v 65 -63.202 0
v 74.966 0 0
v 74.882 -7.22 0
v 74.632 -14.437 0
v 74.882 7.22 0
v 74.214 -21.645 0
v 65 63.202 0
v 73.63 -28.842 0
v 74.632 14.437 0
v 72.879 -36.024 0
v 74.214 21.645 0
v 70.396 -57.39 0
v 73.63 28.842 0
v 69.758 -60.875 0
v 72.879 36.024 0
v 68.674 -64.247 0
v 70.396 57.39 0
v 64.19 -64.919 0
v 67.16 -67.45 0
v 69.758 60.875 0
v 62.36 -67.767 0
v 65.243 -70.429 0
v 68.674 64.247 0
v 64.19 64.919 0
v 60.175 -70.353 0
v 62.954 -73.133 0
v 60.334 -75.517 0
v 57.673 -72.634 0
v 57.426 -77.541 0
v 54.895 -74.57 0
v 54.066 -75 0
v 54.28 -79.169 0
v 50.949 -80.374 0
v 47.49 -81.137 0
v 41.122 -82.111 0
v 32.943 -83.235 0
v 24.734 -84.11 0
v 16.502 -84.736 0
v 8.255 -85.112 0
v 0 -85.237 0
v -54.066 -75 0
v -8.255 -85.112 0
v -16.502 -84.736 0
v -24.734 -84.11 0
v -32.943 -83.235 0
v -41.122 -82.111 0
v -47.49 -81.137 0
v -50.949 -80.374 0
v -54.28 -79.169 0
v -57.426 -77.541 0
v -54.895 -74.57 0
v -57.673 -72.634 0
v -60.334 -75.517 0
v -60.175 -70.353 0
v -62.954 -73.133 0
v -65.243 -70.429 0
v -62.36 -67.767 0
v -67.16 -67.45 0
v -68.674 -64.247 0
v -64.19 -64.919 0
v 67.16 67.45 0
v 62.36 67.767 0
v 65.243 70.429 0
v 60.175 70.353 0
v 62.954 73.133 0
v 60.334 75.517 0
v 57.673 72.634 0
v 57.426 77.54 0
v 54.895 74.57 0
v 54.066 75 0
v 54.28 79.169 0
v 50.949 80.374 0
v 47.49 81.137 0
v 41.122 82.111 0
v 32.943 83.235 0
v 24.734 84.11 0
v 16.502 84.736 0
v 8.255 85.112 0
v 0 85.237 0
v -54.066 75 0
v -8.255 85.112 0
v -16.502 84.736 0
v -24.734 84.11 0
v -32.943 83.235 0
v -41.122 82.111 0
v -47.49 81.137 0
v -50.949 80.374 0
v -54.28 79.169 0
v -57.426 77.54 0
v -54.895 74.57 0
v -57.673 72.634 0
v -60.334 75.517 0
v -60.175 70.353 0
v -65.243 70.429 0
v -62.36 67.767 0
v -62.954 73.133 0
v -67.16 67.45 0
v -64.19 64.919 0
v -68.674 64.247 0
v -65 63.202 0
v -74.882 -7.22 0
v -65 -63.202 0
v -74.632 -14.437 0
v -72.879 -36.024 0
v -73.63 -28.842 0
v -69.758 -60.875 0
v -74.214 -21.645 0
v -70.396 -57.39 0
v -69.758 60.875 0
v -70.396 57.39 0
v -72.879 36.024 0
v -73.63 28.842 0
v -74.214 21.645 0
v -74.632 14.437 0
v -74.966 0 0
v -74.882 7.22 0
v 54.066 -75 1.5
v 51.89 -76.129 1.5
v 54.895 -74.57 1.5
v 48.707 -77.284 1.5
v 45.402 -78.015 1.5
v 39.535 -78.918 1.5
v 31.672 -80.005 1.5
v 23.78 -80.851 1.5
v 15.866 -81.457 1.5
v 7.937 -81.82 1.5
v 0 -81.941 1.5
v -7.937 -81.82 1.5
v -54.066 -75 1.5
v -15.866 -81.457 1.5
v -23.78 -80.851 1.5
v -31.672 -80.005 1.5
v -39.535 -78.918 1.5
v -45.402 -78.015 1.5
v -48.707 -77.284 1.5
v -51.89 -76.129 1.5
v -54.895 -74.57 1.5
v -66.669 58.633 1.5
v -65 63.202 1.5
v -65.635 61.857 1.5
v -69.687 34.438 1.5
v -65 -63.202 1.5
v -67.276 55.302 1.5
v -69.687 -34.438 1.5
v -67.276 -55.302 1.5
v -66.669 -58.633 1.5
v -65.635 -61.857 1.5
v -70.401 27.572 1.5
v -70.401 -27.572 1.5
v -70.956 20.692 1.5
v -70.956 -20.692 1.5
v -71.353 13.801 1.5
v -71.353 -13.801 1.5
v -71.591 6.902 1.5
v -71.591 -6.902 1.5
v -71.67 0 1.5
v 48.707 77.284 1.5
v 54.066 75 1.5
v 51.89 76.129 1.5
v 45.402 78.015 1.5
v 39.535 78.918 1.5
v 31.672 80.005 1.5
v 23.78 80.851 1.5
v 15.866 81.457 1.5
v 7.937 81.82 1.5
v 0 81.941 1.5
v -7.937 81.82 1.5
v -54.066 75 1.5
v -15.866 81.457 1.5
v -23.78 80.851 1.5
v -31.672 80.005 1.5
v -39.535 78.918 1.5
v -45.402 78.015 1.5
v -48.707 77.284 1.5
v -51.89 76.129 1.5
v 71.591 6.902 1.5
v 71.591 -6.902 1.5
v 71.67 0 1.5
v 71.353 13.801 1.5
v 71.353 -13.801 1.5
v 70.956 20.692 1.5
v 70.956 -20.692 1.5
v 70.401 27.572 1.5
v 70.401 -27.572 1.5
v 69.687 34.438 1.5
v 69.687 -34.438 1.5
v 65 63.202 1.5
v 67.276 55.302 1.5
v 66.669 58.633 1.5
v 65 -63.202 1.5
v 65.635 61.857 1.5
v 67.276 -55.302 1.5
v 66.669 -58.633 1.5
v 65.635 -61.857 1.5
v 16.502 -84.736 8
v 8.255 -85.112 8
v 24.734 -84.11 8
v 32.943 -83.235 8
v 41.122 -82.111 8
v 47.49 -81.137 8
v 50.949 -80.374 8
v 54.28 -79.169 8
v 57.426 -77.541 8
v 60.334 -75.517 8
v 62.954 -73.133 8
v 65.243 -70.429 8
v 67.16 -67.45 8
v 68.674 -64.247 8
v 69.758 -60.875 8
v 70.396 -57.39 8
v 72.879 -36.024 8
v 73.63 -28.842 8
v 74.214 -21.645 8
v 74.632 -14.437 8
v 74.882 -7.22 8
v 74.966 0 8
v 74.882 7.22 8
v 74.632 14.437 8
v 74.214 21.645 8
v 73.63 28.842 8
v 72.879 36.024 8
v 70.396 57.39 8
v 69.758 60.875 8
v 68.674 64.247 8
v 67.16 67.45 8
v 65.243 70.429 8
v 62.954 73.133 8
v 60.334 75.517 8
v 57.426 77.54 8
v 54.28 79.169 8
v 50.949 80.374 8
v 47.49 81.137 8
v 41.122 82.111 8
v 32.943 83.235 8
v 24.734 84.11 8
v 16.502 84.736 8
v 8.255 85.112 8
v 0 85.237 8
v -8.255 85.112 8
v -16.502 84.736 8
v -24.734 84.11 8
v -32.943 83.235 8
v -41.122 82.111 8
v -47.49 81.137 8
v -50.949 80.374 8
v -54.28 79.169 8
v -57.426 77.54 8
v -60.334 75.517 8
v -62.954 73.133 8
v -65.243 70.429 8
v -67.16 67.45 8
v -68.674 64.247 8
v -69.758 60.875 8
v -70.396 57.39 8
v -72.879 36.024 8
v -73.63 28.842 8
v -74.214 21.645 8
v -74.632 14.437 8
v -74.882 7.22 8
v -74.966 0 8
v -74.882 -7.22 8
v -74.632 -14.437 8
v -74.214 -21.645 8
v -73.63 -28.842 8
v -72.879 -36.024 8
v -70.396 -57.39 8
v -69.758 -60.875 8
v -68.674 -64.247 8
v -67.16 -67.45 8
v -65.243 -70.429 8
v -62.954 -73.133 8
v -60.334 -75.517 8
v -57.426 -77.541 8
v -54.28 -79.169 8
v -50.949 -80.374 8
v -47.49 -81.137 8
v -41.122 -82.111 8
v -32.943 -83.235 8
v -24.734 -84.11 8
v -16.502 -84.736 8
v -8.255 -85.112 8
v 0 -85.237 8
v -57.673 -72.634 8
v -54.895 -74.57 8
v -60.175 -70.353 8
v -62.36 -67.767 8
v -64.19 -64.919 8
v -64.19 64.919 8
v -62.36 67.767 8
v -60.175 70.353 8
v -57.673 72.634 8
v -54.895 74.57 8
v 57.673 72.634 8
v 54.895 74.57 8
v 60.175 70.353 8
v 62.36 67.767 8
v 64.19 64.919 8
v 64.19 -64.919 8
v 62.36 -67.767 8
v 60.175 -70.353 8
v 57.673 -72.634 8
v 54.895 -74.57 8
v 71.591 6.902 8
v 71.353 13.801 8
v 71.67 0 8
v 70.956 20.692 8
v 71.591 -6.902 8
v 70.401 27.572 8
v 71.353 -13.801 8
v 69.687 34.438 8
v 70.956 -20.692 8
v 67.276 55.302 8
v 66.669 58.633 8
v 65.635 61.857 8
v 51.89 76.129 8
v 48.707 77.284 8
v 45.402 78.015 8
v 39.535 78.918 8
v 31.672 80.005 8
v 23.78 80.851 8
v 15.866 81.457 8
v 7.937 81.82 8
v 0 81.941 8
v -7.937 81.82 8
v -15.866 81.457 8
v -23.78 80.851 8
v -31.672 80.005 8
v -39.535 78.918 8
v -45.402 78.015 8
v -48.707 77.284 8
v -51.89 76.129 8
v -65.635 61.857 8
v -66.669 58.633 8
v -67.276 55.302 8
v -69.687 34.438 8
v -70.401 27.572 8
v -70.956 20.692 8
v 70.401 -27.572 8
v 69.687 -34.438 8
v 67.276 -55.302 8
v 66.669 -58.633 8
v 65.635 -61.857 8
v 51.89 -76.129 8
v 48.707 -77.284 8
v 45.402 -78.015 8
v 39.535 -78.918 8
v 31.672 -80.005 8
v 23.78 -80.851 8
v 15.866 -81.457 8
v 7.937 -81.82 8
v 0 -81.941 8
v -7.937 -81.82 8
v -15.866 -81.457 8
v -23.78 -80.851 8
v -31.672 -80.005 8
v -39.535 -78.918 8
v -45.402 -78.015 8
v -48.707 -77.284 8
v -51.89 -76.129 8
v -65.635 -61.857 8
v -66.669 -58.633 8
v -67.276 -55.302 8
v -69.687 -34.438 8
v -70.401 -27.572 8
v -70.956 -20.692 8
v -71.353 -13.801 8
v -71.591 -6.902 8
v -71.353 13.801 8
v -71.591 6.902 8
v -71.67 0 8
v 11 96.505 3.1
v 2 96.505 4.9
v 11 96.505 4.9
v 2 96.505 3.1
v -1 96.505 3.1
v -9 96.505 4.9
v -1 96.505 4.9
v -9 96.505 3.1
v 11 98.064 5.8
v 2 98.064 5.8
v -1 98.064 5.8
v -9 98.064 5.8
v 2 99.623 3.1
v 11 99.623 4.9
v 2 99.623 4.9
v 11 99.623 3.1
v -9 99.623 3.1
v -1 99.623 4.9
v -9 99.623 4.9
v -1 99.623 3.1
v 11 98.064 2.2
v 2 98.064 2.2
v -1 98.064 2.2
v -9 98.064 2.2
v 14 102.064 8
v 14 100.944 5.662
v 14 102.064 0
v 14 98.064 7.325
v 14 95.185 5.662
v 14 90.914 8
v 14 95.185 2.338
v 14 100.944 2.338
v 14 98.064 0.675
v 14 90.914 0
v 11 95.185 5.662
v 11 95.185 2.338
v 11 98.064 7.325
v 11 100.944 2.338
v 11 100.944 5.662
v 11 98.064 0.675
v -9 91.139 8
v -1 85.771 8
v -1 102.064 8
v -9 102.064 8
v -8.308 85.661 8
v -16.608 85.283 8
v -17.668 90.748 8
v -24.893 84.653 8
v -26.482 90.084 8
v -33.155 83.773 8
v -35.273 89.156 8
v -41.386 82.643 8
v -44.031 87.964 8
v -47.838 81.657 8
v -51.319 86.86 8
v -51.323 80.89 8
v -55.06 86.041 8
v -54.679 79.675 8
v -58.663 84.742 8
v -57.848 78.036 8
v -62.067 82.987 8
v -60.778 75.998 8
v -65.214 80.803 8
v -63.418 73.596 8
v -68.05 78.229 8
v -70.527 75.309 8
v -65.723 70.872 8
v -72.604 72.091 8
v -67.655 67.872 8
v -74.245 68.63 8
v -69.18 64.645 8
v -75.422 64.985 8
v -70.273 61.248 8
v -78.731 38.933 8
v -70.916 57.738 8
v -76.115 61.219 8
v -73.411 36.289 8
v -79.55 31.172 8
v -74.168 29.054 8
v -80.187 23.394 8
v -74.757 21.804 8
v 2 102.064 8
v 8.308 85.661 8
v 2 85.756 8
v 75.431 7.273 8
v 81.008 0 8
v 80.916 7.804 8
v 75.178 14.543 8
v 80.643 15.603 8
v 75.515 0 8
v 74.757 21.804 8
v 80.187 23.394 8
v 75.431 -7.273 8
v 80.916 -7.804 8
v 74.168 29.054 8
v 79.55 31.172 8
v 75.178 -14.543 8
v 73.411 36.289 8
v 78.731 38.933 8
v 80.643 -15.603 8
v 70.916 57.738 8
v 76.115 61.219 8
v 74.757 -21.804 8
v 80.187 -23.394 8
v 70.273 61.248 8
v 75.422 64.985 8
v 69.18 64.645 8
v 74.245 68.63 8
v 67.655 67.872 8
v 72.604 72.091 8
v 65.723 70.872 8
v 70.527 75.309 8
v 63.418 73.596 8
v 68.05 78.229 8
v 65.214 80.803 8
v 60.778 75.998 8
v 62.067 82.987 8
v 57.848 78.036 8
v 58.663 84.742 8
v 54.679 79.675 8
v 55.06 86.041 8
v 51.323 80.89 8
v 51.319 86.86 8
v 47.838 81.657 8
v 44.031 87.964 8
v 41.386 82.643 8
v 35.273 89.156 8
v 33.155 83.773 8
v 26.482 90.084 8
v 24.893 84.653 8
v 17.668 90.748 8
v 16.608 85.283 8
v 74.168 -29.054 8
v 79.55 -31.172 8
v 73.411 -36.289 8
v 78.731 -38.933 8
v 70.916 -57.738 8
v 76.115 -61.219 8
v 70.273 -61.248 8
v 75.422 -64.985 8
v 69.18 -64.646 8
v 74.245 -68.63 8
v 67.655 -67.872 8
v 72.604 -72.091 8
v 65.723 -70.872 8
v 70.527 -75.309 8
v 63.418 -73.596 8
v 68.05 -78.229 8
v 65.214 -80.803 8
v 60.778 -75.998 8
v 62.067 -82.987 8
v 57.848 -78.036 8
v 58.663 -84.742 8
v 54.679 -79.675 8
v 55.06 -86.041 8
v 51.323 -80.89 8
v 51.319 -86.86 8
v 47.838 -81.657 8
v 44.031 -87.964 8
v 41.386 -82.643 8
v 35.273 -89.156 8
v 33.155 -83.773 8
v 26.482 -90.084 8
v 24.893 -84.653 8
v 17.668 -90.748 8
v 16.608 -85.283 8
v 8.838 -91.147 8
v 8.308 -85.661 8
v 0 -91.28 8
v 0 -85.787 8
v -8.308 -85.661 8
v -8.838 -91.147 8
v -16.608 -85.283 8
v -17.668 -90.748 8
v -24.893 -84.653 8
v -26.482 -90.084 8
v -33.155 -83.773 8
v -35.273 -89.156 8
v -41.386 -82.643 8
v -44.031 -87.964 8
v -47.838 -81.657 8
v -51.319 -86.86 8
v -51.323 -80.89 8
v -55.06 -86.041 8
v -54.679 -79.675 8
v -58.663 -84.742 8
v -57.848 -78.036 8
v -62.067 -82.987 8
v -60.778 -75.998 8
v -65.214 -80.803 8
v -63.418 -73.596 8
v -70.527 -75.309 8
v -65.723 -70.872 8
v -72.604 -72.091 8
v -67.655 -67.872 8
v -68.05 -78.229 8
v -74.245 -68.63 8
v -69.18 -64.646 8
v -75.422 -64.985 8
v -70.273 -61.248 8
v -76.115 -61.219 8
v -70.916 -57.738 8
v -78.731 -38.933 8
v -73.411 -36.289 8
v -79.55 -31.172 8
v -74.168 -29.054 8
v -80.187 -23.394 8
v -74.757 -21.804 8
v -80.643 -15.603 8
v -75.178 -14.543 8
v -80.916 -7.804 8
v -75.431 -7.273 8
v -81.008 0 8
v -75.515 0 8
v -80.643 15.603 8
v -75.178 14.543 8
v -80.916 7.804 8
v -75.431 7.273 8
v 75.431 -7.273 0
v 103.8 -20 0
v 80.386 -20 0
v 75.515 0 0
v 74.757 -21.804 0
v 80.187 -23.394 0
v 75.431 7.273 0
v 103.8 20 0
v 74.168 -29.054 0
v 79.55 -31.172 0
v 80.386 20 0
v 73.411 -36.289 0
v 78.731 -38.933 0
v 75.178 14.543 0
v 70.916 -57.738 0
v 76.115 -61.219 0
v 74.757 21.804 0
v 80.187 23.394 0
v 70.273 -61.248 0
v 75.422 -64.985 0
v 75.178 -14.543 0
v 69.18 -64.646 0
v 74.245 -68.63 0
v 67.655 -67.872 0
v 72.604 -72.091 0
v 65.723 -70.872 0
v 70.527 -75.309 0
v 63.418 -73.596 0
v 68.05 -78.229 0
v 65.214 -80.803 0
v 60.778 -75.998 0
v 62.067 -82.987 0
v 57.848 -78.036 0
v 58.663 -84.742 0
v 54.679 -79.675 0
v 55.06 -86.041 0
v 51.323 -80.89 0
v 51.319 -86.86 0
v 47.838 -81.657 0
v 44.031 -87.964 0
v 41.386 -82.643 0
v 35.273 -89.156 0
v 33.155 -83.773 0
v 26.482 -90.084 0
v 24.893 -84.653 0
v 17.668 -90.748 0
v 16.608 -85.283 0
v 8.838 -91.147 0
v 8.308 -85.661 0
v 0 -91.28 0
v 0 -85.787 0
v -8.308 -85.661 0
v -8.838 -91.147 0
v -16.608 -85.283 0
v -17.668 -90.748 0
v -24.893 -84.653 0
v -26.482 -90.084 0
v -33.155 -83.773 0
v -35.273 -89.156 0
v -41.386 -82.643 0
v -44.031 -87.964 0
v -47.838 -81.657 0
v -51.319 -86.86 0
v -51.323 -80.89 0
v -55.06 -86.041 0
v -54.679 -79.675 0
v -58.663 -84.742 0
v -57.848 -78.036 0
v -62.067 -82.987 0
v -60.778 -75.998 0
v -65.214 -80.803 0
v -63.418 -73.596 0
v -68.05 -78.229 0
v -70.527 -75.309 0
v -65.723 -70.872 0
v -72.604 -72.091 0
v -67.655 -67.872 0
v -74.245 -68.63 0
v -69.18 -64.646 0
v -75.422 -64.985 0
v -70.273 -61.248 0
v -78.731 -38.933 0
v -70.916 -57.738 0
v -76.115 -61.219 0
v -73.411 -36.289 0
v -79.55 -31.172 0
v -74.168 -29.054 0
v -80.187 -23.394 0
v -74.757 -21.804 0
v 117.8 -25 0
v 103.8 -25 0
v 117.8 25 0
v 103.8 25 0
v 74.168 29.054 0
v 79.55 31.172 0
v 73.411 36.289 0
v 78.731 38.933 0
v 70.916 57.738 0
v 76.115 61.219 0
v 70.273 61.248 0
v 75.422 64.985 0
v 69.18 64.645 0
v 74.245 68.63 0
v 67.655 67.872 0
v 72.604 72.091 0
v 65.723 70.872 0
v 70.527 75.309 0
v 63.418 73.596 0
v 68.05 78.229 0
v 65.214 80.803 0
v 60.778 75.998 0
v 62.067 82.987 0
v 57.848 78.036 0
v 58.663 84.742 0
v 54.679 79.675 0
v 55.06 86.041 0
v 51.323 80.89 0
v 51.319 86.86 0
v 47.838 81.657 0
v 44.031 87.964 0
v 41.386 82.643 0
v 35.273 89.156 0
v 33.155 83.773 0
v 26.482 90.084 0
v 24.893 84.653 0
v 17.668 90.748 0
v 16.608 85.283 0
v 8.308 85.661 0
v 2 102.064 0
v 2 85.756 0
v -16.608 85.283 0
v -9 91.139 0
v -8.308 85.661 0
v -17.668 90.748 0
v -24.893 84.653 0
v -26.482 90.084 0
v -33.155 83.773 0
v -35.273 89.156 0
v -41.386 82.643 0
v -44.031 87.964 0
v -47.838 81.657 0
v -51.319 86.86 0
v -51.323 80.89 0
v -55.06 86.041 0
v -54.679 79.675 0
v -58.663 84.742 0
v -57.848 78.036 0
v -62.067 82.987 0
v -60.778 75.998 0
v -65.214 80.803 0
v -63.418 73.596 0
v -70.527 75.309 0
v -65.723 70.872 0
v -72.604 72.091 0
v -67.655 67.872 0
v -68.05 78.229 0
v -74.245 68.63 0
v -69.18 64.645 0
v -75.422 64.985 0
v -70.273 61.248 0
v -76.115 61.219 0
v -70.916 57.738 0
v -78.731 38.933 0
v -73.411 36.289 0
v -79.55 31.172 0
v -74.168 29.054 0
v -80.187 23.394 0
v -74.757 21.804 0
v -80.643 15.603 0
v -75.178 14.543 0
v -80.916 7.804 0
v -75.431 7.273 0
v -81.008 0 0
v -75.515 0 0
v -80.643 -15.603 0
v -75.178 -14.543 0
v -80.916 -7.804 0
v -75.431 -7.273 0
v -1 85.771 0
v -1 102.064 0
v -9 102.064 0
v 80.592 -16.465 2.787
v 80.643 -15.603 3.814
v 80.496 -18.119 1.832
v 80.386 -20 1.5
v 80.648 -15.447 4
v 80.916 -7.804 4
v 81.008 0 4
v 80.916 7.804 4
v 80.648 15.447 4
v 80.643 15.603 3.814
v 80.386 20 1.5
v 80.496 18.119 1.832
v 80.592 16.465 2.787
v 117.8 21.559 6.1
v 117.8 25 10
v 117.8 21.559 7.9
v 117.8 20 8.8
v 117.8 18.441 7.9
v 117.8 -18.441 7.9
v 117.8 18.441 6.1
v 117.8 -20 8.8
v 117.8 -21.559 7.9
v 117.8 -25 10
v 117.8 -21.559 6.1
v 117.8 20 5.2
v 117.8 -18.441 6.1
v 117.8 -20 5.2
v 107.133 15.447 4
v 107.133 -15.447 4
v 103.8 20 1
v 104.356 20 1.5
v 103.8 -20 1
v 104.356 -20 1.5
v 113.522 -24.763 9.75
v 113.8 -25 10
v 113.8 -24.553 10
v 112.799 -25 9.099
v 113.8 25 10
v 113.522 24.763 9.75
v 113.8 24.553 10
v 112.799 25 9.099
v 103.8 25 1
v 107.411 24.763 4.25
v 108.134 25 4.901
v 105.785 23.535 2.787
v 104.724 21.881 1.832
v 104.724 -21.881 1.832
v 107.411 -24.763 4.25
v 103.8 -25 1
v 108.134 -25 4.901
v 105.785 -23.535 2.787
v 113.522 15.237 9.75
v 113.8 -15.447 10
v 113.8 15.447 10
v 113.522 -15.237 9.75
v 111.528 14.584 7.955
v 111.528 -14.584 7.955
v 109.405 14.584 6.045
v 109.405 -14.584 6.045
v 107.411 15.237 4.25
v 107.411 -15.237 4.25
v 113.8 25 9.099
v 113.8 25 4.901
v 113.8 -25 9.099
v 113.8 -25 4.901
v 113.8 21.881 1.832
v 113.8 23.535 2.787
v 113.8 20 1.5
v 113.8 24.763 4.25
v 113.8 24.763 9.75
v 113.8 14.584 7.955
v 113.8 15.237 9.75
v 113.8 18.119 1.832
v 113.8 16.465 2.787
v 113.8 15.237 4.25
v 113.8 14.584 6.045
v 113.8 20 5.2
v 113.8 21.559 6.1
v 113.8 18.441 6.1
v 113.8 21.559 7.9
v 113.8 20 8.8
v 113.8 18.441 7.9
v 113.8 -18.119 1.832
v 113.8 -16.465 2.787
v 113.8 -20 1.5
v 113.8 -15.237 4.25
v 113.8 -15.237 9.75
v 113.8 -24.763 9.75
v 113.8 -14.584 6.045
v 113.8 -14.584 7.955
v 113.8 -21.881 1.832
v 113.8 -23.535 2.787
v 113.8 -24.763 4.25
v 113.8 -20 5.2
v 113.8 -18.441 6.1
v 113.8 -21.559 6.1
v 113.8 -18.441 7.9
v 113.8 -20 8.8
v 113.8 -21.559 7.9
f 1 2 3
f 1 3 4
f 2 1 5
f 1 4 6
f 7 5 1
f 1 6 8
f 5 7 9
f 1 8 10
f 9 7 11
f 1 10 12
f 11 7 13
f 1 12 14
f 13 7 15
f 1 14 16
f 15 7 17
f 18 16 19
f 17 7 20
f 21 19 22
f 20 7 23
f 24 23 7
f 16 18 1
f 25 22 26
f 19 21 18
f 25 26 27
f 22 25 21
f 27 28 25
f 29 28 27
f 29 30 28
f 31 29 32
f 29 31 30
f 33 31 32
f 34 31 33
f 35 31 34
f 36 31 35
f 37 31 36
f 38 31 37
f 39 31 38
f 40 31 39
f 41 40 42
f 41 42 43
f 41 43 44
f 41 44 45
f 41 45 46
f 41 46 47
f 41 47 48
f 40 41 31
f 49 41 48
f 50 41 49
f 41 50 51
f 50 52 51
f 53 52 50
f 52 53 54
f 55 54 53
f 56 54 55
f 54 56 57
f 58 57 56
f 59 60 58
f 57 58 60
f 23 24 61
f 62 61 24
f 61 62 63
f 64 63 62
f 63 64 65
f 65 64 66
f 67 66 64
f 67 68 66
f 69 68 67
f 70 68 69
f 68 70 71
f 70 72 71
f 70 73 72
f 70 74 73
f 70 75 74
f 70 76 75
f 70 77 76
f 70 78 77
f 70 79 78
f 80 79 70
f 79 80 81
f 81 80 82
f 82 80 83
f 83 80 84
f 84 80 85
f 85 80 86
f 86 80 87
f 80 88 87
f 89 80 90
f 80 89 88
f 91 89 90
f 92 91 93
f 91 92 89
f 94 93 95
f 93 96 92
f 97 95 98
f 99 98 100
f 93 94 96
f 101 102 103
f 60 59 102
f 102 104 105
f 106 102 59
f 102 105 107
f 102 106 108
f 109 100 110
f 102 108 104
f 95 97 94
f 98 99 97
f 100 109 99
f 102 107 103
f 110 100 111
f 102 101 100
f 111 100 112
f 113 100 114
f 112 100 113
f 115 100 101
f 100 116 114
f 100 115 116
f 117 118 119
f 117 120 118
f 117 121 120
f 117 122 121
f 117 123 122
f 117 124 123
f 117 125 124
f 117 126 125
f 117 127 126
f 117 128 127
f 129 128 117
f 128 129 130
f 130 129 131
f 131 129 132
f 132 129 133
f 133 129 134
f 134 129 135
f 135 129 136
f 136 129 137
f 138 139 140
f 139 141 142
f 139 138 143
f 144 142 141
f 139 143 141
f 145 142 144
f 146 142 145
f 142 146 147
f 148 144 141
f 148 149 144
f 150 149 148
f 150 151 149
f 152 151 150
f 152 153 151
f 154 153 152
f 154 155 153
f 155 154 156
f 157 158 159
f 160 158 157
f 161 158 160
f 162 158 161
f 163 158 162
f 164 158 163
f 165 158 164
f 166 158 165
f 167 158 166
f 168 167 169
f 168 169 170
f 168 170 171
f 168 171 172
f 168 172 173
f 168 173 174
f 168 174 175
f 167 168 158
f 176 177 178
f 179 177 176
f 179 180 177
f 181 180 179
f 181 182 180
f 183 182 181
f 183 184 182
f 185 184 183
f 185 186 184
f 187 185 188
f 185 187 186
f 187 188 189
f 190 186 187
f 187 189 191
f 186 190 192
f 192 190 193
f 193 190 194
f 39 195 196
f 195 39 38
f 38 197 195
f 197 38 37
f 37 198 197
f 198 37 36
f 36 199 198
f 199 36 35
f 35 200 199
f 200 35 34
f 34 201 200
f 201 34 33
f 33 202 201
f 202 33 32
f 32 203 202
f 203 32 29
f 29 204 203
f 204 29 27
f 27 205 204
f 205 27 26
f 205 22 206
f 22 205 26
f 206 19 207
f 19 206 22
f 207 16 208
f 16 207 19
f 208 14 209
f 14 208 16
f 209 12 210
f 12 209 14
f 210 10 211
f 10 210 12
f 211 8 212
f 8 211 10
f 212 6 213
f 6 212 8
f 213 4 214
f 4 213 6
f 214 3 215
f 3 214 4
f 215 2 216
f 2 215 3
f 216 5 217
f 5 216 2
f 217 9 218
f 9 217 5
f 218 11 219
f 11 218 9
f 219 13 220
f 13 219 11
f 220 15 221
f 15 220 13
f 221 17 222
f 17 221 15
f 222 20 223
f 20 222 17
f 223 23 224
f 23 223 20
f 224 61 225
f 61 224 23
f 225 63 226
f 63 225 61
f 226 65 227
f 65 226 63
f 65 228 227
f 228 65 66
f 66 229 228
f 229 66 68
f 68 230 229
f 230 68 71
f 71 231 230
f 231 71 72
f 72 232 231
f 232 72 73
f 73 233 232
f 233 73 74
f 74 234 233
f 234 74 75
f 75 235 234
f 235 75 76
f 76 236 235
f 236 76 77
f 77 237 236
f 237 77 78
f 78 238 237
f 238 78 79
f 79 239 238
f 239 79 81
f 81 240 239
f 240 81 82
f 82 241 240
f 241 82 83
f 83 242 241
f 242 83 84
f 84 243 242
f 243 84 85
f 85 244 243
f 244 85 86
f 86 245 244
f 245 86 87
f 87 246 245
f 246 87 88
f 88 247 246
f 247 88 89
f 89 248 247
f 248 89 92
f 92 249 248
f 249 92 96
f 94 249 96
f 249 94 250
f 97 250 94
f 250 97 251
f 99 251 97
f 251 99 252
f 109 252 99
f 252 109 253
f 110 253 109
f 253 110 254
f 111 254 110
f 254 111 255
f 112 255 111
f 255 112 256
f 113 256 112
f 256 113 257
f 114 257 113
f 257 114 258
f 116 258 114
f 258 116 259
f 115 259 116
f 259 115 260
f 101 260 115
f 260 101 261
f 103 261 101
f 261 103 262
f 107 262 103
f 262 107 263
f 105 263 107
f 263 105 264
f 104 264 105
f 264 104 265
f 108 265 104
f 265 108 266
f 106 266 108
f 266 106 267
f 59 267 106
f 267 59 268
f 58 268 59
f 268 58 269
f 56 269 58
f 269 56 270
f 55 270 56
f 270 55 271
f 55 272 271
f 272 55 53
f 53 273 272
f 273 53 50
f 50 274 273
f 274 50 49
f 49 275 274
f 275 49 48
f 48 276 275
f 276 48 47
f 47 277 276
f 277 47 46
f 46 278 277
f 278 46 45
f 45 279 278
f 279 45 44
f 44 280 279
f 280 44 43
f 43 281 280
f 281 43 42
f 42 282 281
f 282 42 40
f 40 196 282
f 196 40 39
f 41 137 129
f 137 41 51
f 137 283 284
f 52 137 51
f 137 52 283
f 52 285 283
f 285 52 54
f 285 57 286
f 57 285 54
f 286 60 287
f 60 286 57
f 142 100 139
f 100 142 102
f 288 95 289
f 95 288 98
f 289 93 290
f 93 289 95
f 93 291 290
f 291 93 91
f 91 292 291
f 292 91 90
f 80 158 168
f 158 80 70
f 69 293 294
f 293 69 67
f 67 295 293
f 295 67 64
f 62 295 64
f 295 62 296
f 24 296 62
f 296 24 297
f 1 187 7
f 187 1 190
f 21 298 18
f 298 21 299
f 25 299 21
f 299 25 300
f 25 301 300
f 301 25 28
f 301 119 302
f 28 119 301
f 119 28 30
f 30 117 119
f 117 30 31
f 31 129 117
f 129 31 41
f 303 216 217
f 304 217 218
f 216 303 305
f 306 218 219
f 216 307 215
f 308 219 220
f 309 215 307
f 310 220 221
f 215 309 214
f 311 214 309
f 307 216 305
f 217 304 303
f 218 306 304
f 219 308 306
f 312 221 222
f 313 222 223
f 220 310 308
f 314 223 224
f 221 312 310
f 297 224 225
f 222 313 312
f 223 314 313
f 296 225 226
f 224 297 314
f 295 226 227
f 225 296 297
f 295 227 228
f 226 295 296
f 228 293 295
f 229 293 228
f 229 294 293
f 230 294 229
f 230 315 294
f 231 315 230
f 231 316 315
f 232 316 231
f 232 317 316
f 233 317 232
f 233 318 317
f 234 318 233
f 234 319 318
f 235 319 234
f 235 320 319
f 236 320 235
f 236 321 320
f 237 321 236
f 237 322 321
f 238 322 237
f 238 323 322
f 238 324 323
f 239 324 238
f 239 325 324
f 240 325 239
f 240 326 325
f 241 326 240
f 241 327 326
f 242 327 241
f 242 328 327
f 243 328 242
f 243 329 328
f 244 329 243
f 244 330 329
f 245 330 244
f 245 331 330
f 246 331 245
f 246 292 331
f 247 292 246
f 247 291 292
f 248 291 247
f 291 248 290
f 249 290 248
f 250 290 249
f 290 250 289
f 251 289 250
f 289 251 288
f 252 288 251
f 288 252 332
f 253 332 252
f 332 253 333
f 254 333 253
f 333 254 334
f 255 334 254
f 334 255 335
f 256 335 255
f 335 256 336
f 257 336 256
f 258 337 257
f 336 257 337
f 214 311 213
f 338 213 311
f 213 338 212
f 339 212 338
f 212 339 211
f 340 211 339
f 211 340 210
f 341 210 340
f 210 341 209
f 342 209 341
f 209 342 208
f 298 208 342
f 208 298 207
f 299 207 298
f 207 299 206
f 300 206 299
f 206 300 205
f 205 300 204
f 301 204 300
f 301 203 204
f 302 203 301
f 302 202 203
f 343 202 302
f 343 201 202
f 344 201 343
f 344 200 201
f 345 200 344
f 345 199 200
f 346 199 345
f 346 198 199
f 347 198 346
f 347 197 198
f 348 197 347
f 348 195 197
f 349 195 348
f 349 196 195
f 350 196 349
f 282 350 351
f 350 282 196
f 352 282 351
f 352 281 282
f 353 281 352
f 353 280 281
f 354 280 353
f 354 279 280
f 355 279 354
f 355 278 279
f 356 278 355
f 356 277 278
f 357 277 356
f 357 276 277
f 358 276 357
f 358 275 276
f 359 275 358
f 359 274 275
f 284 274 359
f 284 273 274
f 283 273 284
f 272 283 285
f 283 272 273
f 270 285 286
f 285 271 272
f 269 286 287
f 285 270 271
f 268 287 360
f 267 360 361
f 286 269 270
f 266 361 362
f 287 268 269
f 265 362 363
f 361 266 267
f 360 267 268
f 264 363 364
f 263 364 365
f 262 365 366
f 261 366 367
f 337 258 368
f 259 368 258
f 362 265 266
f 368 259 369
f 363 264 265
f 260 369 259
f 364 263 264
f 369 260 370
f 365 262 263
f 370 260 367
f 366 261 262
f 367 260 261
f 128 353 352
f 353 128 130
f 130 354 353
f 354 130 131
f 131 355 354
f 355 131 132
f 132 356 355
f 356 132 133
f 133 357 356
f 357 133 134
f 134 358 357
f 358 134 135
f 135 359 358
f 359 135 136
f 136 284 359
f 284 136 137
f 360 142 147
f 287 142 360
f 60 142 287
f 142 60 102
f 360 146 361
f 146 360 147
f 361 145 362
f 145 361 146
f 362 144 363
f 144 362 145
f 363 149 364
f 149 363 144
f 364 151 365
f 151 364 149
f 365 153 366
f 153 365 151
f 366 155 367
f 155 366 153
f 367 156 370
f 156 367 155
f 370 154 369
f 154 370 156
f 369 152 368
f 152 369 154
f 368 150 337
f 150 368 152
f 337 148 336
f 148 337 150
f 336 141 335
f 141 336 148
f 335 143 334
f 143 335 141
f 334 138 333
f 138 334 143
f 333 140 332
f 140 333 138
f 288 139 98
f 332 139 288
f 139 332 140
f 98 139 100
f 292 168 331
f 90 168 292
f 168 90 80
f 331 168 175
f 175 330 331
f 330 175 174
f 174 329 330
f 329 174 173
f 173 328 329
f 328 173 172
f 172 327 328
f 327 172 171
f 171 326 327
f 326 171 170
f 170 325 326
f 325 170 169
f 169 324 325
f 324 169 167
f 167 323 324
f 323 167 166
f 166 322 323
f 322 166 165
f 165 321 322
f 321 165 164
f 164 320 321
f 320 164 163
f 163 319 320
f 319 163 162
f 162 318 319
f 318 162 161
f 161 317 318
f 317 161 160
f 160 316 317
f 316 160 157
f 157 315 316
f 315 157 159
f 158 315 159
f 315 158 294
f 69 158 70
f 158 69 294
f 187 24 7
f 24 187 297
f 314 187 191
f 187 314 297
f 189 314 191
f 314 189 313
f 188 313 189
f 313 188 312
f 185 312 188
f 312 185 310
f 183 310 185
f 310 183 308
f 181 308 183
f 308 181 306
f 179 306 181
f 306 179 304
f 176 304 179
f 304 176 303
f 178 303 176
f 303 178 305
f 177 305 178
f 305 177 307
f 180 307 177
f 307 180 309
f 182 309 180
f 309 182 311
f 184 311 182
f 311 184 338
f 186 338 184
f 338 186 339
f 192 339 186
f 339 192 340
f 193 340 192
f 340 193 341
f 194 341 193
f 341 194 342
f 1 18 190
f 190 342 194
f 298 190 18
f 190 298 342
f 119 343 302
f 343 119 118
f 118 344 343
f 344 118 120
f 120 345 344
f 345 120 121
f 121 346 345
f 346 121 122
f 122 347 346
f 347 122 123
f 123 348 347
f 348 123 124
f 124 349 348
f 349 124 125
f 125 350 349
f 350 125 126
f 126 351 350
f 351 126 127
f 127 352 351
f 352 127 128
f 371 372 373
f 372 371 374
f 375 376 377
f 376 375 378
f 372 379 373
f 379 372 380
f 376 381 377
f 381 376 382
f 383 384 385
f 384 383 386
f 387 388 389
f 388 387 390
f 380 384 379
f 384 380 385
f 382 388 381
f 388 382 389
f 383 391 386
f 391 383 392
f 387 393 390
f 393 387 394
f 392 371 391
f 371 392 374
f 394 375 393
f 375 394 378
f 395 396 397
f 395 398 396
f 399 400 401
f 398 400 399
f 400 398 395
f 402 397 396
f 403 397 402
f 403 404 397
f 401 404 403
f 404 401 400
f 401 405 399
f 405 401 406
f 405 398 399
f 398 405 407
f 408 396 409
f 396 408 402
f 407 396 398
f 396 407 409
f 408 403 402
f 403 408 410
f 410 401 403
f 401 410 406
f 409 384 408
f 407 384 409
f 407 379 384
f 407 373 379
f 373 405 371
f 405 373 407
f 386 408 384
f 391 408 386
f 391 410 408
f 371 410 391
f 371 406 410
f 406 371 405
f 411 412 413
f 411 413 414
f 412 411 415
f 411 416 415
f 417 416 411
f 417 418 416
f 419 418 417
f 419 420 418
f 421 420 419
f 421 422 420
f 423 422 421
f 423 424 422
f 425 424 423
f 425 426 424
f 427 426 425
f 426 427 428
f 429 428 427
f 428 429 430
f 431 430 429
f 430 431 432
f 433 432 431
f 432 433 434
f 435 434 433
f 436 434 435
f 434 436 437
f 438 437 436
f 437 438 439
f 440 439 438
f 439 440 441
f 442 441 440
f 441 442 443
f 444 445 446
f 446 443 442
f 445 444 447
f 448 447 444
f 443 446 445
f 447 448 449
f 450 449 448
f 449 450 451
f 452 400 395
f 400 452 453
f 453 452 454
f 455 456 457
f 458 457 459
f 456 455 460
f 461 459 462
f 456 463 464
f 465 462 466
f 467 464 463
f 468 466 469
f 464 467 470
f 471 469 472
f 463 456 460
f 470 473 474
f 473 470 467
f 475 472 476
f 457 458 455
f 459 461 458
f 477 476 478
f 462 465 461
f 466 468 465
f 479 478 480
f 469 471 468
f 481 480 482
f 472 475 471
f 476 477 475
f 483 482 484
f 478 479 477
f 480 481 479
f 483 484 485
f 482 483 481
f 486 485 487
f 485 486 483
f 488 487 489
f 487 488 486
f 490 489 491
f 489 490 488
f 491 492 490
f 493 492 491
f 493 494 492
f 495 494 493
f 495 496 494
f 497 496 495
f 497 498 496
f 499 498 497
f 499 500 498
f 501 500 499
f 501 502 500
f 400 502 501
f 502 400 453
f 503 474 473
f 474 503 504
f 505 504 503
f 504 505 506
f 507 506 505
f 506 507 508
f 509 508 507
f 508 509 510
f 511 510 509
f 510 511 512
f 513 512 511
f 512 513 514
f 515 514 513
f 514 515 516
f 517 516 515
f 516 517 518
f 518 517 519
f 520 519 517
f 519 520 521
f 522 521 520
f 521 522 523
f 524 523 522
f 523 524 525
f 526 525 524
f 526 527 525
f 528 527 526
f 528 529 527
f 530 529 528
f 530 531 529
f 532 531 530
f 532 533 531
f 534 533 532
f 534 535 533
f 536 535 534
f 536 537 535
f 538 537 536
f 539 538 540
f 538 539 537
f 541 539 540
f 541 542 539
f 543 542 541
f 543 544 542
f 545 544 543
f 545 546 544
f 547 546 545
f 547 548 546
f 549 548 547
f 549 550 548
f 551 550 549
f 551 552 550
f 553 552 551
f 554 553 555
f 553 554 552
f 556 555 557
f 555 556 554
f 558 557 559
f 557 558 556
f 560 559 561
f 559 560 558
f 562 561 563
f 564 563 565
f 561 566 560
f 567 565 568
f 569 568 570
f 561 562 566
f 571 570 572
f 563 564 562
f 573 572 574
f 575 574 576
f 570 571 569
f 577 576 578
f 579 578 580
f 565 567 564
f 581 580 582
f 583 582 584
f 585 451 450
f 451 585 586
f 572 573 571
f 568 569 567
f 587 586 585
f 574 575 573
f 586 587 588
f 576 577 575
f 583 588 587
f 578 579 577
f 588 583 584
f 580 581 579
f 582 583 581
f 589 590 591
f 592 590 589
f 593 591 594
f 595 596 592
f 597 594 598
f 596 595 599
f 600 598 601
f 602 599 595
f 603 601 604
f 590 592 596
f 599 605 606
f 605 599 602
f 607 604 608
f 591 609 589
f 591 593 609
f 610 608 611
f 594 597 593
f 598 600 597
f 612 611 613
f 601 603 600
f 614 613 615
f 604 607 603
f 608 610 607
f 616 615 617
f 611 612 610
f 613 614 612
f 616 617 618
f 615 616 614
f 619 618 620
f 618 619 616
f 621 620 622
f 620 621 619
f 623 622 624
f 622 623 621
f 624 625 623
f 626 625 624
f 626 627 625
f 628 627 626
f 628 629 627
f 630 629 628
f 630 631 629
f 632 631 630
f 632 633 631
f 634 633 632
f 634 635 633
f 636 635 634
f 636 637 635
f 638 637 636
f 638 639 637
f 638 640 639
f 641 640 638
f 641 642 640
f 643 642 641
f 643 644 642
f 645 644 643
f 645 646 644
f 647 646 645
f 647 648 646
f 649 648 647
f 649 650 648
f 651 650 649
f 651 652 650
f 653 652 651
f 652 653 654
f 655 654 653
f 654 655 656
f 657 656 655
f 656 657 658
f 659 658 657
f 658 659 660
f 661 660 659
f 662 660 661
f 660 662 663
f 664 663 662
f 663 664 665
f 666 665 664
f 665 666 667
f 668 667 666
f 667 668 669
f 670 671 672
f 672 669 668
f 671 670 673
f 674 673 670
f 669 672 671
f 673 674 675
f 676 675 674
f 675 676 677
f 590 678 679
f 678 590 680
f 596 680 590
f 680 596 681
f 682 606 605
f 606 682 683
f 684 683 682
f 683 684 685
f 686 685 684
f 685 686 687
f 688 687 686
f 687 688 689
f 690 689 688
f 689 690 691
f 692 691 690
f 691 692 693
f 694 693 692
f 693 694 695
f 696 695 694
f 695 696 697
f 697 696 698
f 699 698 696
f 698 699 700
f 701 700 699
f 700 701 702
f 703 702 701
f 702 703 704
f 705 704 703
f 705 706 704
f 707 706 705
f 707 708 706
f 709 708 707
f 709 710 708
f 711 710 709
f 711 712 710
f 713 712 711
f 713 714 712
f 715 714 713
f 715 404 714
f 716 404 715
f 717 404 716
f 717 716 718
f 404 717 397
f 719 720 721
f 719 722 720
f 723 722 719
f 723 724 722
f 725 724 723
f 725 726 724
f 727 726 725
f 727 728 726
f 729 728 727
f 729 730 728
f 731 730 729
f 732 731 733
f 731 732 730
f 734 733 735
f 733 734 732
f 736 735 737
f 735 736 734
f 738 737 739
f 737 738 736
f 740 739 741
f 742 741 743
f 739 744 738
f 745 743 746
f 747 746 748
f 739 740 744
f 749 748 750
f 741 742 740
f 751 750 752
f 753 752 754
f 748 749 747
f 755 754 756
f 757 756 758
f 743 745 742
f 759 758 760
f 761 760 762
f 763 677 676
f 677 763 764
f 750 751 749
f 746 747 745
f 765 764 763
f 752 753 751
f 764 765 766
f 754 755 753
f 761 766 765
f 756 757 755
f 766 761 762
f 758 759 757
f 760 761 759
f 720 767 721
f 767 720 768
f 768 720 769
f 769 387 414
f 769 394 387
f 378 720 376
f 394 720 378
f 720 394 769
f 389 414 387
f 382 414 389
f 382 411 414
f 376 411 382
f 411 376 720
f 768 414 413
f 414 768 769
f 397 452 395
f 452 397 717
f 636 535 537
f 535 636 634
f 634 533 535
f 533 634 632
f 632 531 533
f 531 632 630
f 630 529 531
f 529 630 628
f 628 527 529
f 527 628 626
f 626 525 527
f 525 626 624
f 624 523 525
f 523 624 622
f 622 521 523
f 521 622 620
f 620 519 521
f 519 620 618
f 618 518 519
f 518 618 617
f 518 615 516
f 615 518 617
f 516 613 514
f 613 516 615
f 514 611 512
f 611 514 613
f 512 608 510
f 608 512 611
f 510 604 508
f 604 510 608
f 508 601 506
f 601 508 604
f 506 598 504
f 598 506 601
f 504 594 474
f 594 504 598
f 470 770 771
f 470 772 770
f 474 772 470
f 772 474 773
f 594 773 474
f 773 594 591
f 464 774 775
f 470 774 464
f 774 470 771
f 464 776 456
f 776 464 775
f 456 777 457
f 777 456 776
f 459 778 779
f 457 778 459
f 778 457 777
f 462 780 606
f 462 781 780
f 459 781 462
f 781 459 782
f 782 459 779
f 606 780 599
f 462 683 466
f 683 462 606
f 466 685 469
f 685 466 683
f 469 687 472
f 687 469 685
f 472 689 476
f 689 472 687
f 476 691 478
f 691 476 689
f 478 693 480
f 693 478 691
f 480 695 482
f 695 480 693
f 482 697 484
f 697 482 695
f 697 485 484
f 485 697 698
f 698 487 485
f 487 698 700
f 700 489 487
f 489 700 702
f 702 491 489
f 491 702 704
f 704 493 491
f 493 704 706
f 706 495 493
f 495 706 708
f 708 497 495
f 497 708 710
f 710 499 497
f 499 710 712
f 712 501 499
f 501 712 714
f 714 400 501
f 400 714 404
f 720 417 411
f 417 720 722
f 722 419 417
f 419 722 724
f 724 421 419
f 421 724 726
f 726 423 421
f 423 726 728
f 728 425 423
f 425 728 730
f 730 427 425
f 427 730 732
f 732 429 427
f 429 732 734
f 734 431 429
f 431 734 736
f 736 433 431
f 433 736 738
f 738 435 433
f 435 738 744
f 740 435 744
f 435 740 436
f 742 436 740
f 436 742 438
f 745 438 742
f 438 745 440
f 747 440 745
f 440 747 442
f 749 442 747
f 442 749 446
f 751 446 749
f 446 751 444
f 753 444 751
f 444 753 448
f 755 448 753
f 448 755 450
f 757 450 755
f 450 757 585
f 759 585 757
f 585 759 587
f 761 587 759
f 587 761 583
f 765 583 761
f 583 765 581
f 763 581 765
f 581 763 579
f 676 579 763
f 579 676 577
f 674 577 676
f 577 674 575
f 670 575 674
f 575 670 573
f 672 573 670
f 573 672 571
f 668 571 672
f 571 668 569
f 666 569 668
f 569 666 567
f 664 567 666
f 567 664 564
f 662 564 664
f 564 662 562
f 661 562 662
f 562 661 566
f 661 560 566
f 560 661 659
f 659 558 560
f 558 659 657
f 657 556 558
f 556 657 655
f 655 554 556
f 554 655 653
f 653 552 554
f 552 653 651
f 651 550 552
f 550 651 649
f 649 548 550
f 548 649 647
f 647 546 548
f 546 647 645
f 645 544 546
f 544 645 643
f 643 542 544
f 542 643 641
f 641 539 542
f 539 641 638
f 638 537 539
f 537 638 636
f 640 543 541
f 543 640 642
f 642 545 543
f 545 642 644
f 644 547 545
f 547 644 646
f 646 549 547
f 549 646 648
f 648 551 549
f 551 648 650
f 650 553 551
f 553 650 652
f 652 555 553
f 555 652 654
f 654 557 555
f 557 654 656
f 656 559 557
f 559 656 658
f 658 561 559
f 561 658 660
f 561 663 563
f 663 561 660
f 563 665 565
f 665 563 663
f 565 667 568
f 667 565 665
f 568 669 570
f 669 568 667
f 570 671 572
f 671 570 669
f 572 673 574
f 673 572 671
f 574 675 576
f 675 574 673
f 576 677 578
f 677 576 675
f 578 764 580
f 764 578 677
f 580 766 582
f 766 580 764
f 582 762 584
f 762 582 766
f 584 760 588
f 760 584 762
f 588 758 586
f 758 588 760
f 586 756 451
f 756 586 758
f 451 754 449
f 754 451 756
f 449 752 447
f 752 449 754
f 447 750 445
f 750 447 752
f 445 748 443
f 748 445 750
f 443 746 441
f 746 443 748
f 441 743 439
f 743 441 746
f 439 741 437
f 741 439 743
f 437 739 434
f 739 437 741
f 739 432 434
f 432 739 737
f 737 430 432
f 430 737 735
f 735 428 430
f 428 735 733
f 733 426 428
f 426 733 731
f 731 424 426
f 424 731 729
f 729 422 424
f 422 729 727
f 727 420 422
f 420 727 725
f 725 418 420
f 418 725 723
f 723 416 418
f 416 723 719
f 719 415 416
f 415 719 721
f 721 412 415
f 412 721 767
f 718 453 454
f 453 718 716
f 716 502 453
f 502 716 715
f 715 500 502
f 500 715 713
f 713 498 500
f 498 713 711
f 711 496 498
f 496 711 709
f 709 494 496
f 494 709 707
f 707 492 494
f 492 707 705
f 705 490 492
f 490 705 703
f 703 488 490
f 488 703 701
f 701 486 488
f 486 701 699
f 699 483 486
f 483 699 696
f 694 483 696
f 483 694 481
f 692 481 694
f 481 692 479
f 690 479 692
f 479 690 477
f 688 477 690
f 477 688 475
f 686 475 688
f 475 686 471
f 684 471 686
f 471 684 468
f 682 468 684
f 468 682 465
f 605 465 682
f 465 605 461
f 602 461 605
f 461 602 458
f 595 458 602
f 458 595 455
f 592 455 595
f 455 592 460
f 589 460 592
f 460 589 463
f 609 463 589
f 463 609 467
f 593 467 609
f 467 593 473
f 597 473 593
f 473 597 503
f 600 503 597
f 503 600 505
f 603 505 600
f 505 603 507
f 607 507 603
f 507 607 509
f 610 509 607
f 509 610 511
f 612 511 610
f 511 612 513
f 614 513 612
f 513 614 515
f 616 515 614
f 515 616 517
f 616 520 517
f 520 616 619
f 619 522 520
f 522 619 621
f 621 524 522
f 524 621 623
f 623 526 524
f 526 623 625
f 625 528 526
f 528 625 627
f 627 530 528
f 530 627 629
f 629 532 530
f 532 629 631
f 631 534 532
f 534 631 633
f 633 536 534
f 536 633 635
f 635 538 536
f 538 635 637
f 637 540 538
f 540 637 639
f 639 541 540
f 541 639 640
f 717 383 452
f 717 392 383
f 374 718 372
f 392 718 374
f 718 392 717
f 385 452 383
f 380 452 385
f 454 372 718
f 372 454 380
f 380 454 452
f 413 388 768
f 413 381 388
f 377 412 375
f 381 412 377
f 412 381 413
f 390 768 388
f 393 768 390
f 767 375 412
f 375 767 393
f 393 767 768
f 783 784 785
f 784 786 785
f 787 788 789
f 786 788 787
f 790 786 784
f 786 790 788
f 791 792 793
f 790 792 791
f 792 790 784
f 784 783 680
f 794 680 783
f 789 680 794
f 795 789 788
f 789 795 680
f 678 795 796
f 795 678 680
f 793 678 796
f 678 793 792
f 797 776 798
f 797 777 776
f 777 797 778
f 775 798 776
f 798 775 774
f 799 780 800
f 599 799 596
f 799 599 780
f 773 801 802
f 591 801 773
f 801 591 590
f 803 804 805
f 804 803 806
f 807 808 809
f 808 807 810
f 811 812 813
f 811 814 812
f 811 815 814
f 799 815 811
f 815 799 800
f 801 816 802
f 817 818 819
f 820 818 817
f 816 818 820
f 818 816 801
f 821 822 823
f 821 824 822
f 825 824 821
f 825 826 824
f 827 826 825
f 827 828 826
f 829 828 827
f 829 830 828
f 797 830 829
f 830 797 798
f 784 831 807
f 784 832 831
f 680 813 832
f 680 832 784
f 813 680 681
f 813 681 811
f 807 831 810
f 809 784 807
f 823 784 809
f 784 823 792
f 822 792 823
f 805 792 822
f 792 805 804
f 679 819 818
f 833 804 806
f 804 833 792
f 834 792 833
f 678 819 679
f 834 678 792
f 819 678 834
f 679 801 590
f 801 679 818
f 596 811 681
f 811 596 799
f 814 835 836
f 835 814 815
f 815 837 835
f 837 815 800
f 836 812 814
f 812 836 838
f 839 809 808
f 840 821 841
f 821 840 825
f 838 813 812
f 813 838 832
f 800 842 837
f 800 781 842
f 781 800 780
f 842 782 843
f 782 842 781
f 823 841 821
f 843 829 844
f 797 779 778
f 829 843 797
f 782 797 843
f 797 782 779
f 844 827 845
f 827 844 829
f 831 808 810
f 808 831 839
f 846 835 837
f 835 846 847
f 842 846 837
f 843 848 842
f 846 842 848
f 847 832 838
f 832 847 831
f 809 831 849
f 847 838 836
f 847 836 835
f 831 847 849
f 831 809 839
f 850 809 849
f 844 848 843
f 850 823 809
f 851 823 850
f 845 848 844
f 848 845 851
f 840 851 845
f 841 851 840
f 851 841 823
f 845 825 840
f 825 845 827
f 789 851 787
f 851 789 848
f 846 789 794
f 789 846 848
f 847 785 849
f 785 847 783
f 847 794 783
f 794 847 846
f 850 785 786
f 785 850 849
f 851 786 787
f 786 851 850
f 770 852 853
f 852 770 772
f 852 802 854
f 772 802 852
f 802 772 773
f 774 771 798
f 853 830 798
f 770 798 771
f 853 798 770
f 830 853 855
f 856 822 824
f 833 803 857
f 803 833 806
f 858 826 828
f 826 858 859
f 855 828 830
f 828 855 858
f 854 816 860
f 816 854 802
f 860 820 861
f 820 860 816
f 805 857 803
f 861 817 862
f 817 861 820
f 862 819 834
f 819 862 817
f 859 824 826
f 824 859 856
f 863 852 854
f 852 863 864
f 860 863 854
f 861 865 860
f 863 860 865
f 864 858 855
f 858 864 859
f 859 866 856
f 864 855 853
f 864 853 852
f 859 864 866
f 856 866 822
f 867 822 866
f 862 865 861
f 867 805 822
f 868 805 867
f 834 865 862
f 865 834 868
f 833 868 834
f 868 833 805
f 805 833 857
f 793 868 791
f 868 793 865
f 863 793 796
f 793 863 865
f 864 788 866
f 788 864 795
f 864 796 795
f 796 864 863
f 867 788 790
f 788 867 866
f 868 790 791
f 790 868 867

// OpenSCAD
use <polyround.scad>;

// NOTE: consider losses (presser foot size) on corners when setting workarea dimensions
// print with infill above 60% for better stiffness
// this default workarea 130x150 needes 200x200 printer platform space
hoop(workareaWidth = 130, workareaHeight = 150);

// smaller hoops
//hoop(workareaWidth = 80, workareaHeight = 100);
//hoop(workareaWidth = 60, workareaHeight = 80);


innerOuterFramesSpacing = 0.5;
mountingHolesSpacing = 40;

module hoop(workareaWidth = 130, workareaHeight = 150, frameHeight = 8, innerFrameThickness = 3, outerFrameThickness = 5, roundness = 5, tightenerSpace = 3, sizeOffset = 0, withHandle = true, partsMode = 3)
{
    innerFrameWidth = workareaWidth+innerFrameThickness*2+sizeOffset;
    innerFrameHeight = workareaHeight+innerFrameThickness*2+sizeOffset;
    // inner frame
    if (partsMode == 3 || partsMode == 1)
    {    
    linear_extrude(height = 1.5) difference(){
        roundRectangle(innerFrameWidth, innerFrameHeight, roundness, center=true);
        intersection(){
            roundRectangle(workareaWidth+sizeOffset, workareaHeight+sizeOffset, roundness, center=true);
            square(size=[workareaWidth, workareaHeight], center=true);
        }
    }
    linear_extrude(height = frameHeight) difference(){
        roundRectangle(innerFrameWidth, innerFrameHeight, roundness, center=true);
        roundRectangle(workareaWidth+sizeOffset, workareaHeight+sizeOffset, roundness, center=true);
    }
    }
    // outer frame
    if (partsMode == 3 || partsMode == 2)
    {
    spacing = innerOuterFramesSpacing*2;
    outerFrameWidth = innerFrameWidth+outerFrameThickness*2+spacing;
    outerFrameHeight =  innerFrameHeight+outerFrameThickness*2+spacing;
    difference(){
    union(){
        linear_extrude(height = frameHeight) difference(){
            roundRectangle(outerFrameWidth , outerFrameHeight, roundness, center=true);
            roundRectangle(innerFrameWidth+spacing, innerFrameHeight+spacing, roundness,  center=true);
    }
    // tightening handle
        // adjust magic number divider to elminate gap between frame and handle
        translate([-9,outerFrameHeight/28+3/roundness+outerFrameHeight/2,0]) 
        difference(){
            tightnWidth = 20+tightenerSpace;
            cube([tightnWidth ,12,frameHeight]);
            //screw hole
            translate([tightnWidth,8,frameHeight/2]) rotate([0,-90,0]) {cylinder(r=1.8, h=tightnWidth+1); cylinder(r=3.5*0.95, h=3, $fn=6);}
            }
        }
        translate([-1,0,0]) cube([tightenerSpace,innerFrameHeight,frameHeight]);
    }
    // outer frame handle
    if (withHandle)
        translate([outerFrameWidth/15+ innerFrameWidth/2,0,0]) {
            handle(frameHeight);
        }
    }
}

module handle(frameHeight)
{
    difference(){
        union(){
            translate([0,-20,0]) cube([40,40,frameHeight/2]);
            
            translate([36,-(mountingHolesSpacing+10)/2,0]) hull(){
                cube([4,mountingHolesSpacing+10,6+frameHeight/2]);
                translate([-10,0,0])cube([10,mountingHolesSpacing+10,1]);
            }
        }
        // mounting holes
        for(i=[1,-1])
            translate([0,i*mountingHolesSpacing/2,3+frameHeight/2]) rotate([0,90,0]){ 
            cylinder(r=5.5, h=36); cylinder(r=1.8, h=41);
            }
    }
}

module roundRectangle(width=20, height=25, roundness = 5, center = false)
{
  // those two values bellow affects roundness of the frames
  divider = 15;
  cornerR = min([width,height])/roundness;
  
  points=[
    [0,                    0,                      cornerR],
    [-width/divider,       height/2,               height*2],
    [0,                    height,                 cornerR],
    [width/2,              height+height/divider,  width*2],
    [width,                height,                 cornerR],
    [width+width/divider,  height/2,               height*2],
    [width,                0,                      cornerR],
    [width/2,              -height/divider,        width*2]
  ];
  
  if(center){
     translate([-width/2, -height/2,0])  polygon(polyRound(points,10));
   }
   else{
       polygon(polyRound(points,10));
   }
      
     
 }
